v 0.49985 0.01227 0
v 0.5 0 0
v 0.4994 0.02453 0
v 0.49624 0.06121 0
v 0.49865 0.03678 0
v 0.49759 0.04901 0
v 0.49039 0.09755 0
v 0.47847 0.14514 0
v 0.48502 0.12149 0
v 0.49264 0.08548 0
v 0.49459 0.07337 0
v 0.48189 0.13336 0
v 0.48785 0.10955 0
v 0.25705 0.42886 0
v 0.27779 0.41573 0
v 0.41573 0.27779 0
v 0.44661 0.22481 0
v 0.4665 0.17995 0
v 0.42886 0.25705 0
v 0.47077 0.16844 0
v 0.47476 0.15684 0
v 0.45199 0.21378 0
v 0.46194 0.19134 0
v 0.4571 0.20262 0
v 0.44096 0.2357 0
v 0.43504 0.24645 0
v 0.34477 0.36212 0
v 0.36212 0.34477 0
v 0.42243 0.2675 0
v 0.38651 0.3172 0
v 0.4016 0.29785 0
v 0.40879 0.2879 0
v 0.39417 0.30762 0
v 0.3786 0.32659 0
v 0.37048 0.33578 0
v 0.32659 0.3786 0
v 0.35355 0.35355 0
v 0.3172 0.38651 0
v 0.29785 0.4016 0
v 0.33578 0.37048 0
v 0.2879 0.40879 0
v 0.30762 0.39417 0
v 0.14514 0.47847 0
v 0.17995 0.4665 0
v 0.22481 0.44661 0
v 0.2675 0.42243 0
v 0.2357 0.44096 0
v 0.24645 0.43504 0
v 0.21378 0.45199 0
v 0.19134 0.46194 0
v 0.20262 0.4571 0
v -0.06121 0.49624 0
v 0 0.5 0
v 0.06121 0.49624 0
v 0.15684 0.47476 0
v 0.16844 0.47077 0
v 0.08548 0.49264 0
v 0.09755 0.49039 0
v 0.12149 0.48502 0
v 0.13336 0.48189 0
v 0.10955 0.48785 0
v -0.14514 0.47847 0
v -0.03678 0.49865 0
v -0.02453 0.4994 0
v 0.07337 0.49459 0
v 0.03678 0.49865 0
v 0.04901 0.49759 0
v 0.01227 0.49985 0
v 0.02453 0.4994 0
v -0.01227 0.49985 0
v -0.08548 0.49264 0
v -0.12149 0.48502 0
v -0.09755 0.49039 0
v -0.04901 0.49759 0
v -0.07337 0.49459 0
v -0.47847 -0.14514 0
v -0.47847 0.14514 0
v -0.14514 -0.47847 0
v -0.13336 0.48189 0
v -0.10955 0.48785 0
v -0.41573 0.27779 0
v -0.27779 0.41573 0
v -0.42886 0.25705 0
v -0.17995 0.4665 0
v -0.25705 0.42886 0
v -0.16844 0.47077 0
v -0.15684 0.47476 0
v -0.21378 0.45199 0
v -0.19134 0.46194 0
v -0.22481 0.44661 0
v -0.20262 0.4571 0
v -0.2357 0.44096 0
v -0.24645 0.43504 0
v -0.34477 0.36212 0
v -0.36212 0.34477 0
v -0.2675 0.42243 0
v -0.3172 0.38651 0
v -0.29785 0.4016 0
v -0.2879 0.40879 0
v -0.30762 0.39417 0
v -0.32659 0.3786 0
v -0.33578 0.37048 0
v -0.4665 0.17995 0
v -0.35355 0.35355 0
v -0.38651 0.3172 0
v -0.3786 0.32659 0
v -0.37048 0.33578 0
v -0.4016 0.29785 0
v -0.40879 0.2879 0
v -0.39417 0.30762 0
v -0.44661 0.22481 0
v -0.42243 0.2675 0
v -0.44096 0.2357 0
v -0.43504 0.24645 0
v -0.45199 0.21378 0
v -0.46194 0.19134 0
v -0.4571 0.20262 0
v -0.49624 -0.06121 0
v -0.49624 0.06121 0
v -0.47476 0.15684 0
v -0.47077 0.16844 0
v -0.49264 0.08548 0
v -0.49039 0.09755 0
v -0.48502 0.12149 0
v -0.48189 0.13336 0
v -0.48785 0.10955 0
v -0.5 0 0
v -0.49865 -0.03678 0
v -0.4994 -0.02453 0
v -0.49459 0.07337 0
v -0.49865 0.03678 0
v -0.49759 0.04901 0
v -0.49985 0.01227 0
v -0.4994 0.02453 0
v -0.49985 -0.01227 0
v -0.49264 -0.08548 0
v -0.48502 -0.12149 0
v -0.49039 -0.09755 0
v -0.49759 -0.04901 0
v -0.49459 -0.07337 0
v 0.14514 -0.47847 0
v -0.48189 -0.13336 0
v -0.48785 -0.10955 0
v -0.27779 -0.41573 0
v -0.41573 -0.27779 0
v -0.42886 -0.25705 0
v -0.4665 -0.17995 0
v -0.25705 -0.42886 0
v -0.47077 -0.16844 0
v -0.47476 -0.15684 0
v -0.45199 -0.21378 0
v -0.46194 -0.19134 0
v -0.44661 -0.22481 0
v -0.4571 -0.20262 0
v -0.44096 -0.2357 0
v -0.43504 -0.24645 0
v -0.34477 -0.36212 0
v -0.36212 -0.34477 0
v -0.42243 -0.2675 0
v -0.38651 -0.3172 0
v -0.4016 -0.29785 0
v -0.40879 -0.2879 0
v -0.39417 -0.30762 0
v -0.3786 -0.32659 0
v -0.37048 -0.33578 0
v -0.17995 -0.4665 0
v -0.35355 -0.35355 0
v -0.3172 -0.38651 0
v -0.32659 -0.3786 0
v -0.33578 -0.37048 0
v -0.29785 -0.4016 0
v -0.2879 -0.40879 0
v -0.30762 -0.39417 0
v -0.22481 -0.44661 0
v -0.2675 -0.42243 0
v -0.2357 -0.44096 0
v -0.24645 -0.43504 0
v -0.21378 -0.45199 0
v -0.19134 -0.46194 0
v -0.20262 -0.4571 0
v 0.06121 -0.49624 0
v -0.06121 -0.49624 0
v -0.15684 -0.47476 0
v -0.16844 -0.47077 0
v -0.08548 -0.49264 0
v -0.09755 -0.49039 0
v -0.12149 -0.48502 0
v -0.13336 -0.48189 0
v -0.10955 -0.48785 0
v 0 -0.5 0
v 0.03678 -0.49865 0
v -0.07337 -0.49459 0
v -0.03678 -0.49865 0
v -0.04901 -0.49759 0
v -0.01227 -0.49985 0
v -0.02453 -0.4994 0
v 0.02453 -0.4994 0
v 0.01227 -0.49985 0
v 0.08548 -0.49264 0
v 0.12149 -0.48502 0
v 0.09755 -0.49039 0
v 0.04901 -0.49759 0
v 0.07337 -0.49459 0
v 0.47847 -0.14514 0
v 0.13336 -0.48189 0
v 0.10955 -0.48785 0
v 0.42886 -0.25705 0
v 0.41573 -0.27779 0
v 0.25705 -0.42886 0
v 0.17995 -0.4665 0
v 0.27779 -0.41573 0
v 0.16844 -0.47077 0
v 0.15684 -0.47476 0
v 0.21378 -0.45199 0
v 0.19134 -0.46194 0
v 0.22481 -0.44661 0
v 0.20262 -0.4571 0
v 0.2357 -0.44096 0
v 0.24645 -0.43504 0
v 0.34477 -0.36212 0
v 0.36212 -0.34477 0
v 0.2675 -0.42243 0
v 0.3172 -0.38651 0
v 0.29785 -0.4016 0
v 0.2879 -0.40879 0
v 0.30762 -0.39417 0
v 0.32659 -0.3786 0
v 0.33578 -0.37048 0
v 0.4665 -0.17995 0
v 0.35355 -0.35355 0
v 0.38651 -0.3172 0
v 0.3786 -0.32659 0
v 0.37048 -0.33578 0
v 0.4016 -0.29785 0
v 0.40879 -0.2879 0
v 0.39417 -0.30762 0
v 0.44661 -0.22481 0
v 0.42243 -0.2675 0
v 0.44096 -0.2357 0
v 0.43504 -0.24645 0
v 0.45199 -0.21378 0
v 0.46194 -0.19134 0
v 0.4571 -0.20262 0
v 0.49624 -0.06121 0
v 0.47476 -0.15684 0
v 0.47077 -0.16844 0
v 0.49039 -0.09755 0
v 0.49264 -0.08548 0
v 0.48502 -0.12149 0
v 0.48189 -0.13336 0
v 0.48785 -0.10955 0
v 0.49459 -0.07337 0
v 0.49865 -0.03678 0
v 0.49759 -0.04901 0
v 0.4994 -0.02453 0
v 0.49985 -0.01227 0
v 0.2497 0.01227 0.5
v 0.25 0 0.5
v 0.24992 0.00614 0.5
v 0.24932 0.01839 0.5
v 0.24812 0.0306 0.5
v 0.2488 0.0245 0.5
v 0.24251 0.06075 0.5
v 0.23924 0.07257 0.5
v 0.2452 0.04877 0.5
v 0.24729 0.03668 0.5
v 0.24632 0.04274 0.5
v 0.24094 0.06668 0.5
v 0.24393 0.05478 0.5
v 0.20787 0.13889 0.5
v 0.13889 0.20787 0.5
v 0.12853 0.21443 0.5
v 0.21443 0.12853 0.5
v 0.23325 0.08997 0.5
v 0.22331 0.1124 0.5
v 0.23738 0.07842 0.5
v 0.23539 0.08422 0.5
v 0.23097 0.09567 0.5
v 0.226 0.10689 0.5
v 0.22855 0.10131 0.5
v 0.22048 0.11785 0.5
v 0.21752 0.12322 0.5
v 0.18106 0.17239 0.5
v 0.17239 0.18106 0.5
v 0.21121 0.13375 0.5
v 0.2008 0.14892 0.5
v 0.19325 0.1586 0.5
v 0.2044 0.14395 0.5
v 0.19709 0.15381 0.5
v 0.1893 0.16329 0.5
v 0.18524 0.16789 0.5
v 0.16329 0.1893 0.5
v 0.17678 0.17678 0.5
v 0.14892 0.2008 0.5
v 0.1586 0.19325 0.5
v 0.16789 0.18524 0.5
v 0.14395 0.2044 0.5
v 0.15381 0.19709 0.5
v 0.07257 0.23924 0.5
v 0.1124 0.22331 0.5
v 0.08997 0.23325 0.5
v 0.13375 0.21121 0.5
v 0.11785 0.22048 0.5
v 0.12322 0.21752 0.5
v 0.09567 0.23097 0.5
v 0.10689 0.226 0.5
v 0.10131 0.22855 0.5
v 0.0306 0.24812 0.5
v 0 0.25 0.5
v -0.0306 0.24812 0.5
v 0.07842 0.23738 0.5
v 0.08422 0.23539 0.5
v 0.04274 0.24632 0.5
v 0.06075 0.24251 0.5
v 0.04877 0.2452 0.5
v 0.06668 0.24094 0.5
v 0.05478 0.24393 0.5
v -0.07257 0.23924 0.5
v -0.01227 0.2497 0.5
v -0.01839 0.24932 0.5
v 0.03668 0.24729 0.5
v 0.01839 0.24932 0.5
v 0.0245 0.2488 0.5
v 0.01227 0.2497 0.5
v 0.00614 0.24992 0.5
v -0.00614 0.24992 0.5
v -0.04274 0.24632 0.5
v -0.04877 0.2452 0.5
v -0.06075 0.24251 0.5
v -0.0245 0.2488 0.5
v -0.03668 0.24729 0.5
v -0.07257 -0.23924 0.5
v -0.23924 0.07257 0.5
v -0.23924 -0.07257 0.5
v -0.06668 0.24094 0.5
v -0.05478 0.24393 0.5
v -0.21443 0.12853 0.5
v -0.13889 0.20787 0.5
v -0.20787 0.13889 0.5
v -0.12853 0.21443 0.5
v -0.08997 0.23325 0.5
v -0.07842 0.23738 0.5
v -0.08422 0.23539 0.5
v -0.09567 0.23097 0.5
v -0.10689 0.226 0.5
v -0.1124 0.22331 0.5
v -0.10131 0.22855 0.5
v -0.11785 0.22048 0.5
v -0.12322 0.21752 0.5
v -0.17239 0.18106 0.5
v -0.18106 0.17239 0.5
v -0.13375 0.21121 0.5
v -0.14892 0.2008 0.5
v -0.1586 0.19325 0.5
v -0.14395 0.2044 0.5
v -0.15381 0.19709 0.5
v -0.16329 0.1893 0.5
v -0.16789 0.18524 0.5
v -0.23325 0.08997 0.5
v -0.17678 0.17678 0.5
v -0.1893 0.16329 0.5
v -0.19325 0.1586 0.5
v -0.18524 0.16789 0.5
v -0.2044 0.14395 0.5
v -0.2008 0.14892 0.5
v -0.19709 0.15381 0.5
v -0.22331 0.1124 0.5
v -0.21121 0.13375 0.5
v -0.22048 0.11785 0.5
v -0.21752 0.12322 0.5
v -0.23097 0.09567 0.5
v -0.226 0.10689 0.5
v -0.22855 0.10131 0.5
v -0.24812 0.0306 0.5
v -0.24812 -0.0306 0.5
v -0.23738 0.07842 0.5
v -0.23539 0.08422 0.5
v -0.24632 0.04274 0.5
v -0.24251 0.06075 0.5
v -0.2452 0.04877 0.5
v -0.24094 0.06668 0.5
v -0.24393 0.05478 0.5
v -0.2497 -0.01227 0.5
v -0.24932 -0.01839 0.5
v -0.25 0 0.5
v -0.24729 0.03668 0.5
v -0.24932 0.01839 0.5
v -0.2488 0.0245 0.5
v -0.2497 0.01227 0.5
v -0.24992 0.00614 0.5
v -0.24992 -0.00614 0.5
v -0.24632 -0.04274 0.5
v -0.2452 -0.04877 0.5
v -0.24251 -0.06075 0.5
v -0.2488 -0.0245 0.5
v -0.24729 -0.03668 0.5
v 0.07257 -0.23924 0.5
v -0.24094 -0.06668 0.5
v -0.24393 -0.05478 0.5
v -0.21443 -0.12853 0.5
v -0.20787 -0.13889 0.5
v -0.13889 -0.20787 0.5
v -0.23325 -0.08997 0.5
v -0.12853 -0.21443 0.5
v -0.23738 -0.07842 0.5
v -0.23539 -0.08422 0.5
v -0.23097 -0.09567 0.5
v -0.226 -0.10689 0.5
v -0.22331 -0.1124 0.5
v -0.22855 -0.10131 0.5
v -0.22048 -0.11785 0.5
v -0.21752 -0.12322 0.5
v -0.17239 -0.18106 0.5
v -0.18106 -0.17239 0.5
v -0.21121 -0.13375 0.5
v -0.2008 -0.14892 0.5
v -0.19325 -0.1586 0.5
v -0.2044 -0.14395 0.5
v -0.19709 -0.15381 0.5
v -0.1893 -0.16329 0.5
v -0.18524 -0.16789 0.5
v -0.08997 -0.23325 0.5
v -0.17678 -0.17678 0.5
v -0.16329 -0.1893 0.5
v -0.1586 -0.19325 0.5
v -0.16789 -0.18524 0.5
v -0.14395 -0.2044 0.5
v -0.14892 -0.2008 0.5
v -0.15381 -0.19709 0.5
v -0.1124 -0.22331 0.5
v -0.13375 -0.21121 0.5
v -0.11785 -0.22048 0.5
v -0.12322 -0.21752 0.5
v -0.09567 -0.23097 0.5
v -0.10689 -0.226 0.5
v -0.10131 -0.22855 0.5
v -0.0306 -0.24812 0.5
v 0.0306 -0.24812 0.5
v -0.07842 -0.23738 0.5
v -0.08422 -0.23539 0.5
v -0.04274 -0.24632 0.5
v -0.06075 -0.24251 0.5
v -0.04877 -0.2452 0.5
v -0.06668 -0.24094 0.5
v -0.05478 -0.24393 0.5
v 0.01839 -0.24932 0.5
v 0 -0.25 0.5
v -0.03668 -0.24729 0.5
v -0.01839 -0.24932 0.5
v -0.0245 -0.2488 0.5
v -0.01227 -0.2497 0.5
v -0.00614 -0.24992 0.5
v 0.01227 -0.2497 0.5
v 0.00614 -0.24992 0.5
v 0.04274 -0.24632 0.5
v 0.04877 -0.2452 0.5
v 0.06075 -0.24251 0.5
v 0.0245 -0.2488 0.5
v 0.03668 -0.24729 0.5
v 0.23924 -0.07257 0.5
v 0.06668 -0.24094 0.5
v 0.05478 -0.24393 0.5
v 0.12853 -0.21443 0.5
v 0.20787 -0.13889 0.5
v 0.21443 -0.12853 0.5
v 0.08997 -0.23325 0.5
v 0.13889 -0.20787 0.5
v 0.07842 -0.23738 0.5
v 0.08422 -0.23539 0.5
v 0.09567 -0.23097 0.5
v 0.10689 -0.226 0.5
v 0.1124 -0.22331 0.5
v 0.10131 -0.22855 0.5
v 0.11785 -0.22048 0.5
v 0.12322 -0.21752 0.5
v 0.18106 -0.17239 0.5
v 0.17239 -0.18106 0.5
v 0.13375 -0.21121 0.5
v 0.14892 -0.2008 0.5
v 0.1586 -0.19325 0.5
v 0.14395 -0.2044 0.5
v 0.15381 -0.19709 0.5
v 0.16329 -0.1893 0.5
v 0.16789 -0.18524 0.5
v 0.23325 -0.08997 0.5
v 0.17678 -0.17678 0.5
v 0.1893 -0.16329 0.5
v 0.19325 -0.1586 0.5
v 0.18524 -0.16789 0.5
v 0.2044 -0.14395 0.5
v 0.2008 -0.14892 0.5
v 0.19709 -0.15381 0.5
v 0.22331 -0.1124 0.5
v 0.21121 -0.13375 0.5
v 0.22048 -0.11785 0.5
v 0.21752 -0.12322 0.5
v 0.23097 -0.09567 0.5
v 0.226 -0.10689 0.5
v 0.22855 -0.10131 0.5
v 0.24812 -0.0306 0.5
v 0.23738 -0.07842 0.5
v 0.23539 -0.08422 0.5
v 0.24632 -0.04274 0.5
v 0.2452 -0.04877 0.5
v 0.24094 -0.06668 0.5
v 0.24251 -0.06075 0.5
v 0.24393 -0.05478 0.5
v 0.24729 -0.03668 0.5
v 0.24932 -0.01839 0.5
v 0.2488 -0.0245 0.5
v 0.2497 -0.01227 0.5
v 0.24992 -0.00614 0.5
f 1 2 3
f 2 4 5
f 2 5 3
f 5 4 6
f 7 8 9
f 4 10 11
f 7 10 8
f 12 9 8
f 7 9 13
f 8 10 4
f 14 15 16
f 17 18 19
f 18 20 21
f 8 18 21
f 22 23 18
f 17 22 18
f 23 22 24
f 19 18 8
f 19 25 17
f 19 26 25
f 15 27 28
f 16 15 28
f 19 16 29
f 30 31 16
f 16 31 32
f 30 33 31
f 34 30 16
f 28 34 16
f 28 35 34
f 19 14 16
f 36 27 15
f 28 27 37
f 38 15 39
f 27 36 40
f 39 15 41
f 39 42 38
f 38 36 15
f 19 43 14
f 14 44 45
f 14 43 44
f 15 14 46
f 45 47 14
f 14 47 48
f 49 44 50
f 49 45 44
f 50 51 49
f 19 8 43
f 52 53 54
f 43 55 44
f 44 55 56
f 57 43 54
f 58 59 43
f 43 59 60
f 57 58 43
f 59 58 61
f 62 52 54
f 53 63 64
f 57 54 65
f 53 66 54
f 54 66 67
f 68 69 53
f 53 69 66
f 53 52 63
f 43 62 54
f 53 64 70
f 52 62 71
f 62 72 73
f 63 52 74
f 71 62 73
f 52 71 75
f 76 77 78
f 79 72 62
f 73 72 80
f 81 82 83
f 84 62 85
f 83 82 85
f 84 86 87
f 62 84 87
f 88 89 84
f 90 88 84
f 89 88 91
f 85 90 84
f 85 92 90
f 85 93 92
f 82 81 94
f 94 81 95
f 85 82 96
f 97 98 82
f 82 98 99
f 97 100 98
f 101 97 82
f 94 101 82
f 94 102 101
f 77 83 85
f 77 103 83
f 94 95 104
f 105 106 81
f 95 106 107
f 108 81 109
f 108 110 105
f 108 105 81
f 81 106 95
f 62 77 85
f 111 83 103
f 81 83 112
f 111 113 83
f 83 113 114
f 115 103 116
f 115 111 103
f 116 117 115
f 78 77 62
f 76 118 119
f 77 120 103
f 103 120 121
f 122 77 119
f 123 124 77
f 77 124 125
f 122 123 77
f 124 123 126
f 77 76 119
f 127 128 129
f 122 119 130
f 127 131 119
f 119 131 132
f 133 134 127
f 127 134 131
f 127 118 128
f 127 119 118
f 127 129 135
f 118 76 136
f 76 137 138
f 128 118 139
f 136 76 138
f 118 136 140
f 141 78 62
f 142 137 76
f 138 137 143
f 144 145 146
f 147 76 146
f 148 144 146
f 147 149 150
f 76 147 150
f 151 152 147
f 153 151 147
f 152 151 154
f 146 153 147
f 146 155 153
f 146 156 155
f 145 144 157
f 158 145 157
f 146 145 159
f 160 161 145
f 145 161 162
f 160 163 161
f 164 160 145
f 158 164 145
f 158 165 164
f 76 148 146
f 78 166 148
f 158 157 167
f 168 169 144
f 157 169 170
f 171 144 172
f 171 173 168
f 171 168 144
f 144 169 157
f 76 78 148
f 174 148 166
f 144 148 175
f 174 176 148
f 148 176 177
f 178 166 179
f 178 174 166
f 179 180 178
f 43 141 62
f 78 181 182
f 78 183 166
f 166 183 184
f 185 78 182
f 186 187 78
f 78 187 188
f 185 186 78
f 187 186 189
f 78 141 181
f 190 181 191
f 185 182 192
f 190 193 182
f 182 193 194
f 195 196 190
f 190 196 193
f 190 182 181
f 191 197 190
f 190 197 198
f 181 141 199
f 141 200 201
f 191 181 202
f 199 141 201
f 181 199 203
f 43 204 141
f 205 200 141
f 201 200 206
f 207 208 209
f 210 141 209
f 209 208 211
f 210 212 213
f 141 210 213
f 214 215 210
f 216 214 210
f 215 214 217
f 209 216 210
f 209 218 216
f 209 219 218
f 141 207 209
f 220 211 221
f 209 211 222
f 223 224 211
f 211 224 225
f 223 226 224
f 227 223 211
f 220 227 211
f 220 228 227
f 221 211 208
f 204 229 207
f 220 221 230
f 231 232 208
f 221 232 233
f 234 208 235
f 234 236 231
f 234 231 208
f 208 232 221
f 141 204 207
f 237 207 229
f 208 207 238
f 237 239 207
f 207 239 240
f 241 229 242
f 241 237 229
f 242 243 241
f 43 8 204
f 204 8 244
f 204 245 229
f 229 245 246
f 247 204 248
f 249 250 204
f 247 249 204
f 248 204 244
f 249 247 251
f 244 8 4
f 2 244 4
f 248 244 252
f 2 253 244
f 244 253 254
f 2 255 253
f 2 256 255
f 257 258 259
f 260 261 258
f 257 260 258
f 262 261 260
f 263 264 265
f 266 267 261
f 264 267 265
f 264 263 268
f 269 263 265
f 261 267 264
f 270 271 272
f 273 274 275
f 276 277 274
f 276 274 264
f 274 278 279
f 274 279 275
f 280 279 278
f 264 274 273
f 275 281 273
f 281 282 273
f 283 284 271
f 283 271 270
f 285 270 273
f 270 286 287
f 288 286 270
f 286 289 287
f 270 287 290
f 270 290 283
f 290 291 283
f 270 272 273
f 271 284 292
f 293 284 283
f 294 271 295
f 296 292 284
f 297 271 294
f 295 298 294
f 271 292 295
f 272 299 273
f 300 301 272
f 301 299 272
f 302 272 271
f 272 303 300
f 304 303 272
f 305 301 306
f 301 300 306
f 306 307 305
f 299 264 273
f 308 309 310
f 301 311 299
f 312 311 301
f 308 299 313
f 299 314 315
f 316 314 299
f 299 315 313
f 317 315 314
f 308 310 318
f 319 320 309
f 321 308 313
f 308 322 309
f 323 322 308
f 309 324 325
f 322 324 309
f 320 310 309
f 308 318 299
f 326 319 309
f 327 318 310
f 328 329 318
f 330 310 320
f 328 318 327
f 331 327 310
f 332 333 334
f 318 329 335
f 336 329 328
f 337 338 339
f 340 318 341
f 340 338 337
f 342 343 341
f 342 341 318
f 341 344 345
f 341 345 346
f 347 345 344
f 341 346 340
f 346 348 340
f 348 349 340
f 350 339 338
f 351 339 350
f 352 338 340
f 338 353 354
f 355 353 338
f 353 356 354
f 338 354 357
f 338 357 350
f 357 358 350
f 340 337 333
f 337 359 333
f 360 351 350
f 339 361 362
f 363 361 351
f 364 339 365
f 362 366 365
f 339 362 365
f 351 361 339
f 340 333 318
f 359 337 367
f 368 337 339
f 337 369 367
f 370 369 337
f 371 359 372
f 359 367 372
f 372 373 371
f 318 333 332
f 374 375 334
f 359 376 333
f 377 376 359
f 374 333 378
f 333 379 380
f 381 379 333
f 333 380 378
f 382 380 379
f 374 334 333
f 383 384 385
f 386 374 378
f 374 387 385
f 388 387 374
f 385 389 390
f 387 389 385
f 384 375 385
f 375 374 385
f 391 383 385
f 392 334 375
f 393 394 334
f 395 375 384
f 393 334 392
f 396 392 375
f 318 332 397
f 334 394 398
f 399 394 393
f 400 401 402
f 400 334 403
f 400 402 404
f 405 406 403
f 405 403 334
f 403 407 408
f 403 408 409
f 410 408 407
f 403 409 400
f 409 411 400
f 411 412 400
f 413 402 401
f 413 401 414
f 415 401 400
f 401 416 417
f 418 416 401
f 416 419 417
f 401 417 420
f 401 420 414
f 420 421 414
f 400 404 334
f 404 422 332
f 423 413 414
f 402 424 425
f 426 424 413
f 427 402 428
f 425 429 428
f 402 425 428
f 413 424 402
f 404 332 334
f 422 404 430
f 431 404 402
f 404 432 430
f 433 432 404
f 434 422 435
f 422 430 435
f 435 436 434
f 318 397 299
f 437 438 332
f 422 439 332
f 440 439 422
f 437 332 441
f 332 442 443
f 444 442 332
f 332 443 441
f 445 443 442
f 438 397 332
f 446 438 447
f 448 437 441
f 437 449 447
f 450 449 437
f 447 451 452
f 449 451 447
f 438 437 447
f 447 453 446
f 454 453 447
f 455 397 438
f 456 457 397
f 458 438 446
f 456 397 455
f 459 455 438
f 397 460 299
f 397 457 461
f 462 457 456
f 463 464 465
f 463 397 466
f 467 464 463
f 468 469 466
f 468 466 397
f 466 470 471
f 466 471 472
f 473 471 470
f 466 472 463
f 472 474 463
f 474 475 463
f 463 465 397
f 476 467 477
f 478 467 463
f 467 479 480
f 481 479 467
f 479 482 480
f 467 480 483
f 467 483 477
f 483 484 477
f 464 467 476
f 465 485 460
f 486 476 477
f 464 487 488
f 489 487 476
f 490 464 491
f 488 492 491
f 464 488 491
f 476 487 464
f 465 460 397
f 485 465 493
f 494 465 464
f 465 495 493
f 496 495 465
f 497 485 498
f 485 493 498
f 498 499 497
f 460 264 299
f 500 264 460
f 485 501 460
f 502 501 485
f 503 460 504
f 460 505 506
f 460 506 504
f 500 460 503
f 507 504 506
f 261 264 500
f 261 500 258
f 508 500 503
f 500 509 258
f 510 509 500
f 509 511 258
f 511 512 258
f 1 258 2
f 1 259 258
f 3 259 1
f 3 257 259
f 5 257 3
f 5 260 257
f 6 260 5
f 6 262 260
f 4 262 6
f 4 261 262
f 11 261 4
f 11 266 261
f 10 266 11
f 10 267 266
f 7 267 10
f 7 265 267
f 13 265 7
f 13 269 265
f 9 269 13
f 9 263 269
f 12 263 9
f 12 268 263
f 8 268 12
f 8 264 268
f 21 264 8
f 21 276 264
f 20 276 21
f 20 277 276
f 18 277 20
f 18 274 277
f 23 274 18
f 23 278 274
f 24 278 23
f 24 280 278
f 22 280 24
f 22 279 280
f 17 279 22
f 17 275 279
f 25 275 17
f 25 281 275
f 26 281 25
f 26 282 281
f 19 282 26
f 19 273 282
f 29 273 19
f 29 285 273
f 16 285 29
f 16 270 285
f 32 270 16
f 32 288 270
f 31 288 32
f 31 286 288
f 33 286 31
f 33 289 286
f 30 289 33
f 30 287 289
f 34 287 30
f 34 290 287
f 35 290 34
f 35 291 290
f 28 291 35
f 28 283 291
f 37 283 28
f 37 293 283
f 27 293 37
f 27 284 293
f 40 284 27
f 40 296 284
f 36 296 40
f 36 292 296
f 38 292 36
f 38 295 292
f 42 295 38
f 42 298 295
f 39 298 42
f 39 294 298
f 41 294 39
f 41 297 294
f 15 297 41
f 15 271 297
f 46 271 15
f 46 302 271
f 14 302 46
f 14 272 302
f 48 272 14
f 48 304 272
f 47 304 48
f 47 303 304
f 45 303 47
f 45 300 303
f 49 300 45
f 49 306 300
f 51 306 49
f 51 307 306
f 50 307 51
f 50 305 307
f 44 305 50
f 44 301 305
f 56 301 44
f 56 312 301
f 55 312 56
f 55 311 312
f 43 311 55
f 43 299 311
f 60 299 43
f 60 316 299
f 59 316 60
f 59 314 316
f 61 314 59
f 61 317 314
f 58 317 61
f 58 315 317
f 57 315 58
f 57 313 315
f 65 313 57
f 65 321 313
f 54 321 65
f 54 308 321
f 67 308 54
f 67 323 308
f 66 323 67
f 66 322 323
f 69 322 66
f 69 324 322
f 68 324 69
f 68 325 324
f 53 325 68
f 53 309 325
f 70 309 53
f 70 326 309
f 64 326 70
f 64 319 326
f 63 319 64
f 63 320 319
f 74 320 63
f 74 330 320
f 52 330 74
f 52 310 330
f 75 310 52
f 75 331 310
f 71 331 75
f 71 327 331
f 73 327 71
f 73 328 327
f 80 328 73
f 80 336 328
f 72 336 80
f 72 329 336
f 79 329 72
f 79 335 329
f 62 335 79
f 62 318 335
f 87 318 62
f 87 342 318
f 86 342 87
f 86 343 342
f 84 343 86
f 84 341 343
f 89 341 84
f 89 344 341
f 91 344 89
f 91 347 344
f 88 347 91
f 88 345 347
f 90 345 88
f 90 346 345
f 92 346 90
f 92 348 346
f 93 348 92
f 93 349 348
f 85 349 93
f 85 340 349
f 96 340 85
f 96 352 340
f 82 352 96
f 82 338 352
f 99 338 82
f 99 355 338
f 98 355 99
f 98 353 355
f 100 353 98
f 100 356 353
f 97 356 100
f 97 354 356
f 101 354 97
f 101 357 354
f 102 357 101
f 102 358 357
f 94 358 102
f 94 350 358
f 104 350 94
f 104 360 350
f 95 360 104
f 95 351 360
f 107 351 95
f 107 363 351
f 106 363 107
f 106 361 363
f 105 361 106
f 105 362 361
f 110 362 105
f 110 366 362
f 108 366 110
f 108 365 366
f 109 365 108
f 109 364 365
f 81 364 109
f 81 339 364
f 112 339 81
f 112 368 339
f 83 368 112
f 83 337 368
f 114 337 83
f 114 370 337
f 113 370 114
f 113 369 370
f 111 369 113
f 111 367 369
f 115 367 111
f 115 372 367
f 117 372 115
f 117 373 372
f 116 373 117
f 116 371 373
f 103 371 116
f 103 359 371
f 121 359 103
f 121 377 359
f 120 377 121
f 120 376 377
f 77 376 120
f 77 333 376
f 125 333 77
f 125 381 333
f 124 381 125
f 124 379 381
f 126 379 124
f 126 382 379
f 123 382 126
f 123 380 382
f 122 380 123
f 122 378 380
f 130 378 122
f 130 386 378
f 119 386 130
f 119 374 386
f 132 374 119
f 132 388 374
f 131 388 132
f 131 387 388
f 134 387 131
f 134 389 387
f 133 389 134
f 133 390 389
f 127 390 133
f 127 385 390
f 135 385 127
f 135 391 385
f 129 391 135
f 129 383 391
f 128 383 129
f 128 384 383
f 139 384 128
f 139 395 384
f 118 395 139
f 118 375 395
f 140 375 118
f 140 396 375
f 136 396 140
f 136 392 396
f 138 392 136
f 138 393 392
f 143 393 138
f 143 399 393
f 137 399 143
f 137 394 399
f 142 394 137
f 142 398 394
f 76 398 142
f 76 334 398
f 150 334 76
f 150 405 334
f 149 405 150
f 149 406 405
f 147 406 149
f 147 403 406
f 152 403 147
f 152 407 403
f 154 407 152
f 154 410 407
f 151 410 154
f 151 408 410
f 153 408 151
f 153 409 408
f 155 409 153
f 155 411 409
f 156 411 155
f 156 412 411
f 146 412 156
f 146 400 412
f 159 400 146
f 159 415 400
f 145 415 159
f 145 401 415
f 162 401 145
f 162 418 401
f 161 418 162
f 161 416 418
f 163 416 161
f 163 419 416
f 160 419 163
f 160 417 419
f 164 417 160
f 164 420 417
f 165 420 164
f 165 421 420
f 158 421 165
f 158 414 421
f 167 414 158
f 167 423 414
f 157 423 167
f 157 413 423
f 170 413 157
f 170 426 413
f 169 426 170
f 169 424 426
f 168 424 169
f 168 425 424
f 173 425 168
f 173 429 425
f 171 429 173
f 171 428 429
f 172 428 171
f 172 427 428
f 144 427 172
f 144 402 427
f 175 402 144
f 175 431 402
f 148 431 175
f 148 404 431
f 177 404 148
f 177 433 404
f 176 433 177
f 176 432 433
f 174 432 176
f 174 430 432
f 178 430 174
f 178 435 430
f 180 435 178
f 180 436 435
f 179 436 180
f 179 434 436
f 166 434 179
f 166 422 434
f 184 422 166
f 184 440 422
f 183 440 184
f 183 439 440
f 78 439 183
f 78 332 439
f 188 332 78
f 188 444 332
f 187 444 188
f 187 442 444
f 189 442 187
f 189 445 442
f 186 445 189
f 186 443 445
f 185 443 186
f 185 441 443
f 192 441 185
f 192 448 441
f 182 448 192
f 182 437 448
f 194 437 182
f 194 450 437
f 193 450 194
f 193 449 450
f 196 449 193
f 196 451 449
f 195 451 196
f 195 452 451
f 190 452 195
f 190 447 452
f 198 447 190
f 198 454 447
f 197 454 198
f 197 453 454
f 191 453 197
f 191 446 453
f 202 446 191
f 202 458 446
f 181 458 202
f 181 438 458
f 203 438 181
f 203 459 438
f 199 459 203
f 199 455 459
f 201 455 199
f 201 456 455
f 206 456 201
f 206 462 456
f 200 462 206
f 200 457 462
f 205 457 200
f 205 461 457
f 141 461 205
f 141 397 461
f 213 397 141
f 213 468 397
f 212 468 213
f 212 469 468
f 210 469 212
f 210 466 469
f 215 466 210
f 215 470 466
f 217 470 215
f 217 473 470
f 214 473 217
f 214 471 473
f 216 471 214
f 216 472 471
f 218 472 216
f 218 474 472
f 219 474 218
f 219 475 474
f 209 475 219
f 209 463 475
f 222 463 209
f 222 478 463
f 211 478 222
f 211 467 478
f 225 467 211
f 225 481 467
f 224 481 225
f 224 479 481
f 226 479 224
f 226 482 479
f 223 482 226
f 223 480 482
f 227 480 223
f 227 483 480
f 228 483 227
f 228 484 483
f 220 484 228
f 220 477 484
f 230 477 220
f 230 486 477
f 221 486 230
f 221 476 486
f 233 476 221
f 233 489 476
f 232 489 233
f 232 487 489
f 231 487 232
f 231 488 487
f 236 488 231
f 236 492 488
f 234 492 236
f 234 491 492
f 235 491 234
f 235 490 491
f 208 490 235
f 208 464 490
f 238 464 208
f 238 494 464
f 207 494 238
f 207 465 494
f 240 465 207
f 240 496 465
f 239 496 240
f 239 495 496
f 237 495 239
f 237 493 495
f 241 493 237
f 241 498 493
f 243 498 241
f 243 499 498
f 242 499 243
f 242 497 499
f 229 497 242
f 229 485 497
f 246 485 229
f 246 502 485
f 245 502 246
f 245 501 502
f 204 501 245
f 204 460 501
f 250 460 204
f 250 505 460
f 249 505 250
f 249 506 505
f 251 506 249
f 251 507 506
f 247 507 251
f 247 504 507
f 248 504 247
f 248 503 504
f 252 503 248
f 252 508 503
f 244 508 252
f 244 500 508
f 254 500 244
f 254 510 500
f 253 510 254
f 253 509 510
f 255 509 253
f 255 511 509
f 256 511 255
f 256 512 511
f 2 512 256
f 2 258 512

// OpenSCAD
// Frustum (Conical) for Stacks of Shapes
// by Slashee the Cow
$fn = $preview ? 1024 : 256;

color("CornflowerBlue")
linear_extrude(0.5, false, scale = 0.5)
circle(d=1);
